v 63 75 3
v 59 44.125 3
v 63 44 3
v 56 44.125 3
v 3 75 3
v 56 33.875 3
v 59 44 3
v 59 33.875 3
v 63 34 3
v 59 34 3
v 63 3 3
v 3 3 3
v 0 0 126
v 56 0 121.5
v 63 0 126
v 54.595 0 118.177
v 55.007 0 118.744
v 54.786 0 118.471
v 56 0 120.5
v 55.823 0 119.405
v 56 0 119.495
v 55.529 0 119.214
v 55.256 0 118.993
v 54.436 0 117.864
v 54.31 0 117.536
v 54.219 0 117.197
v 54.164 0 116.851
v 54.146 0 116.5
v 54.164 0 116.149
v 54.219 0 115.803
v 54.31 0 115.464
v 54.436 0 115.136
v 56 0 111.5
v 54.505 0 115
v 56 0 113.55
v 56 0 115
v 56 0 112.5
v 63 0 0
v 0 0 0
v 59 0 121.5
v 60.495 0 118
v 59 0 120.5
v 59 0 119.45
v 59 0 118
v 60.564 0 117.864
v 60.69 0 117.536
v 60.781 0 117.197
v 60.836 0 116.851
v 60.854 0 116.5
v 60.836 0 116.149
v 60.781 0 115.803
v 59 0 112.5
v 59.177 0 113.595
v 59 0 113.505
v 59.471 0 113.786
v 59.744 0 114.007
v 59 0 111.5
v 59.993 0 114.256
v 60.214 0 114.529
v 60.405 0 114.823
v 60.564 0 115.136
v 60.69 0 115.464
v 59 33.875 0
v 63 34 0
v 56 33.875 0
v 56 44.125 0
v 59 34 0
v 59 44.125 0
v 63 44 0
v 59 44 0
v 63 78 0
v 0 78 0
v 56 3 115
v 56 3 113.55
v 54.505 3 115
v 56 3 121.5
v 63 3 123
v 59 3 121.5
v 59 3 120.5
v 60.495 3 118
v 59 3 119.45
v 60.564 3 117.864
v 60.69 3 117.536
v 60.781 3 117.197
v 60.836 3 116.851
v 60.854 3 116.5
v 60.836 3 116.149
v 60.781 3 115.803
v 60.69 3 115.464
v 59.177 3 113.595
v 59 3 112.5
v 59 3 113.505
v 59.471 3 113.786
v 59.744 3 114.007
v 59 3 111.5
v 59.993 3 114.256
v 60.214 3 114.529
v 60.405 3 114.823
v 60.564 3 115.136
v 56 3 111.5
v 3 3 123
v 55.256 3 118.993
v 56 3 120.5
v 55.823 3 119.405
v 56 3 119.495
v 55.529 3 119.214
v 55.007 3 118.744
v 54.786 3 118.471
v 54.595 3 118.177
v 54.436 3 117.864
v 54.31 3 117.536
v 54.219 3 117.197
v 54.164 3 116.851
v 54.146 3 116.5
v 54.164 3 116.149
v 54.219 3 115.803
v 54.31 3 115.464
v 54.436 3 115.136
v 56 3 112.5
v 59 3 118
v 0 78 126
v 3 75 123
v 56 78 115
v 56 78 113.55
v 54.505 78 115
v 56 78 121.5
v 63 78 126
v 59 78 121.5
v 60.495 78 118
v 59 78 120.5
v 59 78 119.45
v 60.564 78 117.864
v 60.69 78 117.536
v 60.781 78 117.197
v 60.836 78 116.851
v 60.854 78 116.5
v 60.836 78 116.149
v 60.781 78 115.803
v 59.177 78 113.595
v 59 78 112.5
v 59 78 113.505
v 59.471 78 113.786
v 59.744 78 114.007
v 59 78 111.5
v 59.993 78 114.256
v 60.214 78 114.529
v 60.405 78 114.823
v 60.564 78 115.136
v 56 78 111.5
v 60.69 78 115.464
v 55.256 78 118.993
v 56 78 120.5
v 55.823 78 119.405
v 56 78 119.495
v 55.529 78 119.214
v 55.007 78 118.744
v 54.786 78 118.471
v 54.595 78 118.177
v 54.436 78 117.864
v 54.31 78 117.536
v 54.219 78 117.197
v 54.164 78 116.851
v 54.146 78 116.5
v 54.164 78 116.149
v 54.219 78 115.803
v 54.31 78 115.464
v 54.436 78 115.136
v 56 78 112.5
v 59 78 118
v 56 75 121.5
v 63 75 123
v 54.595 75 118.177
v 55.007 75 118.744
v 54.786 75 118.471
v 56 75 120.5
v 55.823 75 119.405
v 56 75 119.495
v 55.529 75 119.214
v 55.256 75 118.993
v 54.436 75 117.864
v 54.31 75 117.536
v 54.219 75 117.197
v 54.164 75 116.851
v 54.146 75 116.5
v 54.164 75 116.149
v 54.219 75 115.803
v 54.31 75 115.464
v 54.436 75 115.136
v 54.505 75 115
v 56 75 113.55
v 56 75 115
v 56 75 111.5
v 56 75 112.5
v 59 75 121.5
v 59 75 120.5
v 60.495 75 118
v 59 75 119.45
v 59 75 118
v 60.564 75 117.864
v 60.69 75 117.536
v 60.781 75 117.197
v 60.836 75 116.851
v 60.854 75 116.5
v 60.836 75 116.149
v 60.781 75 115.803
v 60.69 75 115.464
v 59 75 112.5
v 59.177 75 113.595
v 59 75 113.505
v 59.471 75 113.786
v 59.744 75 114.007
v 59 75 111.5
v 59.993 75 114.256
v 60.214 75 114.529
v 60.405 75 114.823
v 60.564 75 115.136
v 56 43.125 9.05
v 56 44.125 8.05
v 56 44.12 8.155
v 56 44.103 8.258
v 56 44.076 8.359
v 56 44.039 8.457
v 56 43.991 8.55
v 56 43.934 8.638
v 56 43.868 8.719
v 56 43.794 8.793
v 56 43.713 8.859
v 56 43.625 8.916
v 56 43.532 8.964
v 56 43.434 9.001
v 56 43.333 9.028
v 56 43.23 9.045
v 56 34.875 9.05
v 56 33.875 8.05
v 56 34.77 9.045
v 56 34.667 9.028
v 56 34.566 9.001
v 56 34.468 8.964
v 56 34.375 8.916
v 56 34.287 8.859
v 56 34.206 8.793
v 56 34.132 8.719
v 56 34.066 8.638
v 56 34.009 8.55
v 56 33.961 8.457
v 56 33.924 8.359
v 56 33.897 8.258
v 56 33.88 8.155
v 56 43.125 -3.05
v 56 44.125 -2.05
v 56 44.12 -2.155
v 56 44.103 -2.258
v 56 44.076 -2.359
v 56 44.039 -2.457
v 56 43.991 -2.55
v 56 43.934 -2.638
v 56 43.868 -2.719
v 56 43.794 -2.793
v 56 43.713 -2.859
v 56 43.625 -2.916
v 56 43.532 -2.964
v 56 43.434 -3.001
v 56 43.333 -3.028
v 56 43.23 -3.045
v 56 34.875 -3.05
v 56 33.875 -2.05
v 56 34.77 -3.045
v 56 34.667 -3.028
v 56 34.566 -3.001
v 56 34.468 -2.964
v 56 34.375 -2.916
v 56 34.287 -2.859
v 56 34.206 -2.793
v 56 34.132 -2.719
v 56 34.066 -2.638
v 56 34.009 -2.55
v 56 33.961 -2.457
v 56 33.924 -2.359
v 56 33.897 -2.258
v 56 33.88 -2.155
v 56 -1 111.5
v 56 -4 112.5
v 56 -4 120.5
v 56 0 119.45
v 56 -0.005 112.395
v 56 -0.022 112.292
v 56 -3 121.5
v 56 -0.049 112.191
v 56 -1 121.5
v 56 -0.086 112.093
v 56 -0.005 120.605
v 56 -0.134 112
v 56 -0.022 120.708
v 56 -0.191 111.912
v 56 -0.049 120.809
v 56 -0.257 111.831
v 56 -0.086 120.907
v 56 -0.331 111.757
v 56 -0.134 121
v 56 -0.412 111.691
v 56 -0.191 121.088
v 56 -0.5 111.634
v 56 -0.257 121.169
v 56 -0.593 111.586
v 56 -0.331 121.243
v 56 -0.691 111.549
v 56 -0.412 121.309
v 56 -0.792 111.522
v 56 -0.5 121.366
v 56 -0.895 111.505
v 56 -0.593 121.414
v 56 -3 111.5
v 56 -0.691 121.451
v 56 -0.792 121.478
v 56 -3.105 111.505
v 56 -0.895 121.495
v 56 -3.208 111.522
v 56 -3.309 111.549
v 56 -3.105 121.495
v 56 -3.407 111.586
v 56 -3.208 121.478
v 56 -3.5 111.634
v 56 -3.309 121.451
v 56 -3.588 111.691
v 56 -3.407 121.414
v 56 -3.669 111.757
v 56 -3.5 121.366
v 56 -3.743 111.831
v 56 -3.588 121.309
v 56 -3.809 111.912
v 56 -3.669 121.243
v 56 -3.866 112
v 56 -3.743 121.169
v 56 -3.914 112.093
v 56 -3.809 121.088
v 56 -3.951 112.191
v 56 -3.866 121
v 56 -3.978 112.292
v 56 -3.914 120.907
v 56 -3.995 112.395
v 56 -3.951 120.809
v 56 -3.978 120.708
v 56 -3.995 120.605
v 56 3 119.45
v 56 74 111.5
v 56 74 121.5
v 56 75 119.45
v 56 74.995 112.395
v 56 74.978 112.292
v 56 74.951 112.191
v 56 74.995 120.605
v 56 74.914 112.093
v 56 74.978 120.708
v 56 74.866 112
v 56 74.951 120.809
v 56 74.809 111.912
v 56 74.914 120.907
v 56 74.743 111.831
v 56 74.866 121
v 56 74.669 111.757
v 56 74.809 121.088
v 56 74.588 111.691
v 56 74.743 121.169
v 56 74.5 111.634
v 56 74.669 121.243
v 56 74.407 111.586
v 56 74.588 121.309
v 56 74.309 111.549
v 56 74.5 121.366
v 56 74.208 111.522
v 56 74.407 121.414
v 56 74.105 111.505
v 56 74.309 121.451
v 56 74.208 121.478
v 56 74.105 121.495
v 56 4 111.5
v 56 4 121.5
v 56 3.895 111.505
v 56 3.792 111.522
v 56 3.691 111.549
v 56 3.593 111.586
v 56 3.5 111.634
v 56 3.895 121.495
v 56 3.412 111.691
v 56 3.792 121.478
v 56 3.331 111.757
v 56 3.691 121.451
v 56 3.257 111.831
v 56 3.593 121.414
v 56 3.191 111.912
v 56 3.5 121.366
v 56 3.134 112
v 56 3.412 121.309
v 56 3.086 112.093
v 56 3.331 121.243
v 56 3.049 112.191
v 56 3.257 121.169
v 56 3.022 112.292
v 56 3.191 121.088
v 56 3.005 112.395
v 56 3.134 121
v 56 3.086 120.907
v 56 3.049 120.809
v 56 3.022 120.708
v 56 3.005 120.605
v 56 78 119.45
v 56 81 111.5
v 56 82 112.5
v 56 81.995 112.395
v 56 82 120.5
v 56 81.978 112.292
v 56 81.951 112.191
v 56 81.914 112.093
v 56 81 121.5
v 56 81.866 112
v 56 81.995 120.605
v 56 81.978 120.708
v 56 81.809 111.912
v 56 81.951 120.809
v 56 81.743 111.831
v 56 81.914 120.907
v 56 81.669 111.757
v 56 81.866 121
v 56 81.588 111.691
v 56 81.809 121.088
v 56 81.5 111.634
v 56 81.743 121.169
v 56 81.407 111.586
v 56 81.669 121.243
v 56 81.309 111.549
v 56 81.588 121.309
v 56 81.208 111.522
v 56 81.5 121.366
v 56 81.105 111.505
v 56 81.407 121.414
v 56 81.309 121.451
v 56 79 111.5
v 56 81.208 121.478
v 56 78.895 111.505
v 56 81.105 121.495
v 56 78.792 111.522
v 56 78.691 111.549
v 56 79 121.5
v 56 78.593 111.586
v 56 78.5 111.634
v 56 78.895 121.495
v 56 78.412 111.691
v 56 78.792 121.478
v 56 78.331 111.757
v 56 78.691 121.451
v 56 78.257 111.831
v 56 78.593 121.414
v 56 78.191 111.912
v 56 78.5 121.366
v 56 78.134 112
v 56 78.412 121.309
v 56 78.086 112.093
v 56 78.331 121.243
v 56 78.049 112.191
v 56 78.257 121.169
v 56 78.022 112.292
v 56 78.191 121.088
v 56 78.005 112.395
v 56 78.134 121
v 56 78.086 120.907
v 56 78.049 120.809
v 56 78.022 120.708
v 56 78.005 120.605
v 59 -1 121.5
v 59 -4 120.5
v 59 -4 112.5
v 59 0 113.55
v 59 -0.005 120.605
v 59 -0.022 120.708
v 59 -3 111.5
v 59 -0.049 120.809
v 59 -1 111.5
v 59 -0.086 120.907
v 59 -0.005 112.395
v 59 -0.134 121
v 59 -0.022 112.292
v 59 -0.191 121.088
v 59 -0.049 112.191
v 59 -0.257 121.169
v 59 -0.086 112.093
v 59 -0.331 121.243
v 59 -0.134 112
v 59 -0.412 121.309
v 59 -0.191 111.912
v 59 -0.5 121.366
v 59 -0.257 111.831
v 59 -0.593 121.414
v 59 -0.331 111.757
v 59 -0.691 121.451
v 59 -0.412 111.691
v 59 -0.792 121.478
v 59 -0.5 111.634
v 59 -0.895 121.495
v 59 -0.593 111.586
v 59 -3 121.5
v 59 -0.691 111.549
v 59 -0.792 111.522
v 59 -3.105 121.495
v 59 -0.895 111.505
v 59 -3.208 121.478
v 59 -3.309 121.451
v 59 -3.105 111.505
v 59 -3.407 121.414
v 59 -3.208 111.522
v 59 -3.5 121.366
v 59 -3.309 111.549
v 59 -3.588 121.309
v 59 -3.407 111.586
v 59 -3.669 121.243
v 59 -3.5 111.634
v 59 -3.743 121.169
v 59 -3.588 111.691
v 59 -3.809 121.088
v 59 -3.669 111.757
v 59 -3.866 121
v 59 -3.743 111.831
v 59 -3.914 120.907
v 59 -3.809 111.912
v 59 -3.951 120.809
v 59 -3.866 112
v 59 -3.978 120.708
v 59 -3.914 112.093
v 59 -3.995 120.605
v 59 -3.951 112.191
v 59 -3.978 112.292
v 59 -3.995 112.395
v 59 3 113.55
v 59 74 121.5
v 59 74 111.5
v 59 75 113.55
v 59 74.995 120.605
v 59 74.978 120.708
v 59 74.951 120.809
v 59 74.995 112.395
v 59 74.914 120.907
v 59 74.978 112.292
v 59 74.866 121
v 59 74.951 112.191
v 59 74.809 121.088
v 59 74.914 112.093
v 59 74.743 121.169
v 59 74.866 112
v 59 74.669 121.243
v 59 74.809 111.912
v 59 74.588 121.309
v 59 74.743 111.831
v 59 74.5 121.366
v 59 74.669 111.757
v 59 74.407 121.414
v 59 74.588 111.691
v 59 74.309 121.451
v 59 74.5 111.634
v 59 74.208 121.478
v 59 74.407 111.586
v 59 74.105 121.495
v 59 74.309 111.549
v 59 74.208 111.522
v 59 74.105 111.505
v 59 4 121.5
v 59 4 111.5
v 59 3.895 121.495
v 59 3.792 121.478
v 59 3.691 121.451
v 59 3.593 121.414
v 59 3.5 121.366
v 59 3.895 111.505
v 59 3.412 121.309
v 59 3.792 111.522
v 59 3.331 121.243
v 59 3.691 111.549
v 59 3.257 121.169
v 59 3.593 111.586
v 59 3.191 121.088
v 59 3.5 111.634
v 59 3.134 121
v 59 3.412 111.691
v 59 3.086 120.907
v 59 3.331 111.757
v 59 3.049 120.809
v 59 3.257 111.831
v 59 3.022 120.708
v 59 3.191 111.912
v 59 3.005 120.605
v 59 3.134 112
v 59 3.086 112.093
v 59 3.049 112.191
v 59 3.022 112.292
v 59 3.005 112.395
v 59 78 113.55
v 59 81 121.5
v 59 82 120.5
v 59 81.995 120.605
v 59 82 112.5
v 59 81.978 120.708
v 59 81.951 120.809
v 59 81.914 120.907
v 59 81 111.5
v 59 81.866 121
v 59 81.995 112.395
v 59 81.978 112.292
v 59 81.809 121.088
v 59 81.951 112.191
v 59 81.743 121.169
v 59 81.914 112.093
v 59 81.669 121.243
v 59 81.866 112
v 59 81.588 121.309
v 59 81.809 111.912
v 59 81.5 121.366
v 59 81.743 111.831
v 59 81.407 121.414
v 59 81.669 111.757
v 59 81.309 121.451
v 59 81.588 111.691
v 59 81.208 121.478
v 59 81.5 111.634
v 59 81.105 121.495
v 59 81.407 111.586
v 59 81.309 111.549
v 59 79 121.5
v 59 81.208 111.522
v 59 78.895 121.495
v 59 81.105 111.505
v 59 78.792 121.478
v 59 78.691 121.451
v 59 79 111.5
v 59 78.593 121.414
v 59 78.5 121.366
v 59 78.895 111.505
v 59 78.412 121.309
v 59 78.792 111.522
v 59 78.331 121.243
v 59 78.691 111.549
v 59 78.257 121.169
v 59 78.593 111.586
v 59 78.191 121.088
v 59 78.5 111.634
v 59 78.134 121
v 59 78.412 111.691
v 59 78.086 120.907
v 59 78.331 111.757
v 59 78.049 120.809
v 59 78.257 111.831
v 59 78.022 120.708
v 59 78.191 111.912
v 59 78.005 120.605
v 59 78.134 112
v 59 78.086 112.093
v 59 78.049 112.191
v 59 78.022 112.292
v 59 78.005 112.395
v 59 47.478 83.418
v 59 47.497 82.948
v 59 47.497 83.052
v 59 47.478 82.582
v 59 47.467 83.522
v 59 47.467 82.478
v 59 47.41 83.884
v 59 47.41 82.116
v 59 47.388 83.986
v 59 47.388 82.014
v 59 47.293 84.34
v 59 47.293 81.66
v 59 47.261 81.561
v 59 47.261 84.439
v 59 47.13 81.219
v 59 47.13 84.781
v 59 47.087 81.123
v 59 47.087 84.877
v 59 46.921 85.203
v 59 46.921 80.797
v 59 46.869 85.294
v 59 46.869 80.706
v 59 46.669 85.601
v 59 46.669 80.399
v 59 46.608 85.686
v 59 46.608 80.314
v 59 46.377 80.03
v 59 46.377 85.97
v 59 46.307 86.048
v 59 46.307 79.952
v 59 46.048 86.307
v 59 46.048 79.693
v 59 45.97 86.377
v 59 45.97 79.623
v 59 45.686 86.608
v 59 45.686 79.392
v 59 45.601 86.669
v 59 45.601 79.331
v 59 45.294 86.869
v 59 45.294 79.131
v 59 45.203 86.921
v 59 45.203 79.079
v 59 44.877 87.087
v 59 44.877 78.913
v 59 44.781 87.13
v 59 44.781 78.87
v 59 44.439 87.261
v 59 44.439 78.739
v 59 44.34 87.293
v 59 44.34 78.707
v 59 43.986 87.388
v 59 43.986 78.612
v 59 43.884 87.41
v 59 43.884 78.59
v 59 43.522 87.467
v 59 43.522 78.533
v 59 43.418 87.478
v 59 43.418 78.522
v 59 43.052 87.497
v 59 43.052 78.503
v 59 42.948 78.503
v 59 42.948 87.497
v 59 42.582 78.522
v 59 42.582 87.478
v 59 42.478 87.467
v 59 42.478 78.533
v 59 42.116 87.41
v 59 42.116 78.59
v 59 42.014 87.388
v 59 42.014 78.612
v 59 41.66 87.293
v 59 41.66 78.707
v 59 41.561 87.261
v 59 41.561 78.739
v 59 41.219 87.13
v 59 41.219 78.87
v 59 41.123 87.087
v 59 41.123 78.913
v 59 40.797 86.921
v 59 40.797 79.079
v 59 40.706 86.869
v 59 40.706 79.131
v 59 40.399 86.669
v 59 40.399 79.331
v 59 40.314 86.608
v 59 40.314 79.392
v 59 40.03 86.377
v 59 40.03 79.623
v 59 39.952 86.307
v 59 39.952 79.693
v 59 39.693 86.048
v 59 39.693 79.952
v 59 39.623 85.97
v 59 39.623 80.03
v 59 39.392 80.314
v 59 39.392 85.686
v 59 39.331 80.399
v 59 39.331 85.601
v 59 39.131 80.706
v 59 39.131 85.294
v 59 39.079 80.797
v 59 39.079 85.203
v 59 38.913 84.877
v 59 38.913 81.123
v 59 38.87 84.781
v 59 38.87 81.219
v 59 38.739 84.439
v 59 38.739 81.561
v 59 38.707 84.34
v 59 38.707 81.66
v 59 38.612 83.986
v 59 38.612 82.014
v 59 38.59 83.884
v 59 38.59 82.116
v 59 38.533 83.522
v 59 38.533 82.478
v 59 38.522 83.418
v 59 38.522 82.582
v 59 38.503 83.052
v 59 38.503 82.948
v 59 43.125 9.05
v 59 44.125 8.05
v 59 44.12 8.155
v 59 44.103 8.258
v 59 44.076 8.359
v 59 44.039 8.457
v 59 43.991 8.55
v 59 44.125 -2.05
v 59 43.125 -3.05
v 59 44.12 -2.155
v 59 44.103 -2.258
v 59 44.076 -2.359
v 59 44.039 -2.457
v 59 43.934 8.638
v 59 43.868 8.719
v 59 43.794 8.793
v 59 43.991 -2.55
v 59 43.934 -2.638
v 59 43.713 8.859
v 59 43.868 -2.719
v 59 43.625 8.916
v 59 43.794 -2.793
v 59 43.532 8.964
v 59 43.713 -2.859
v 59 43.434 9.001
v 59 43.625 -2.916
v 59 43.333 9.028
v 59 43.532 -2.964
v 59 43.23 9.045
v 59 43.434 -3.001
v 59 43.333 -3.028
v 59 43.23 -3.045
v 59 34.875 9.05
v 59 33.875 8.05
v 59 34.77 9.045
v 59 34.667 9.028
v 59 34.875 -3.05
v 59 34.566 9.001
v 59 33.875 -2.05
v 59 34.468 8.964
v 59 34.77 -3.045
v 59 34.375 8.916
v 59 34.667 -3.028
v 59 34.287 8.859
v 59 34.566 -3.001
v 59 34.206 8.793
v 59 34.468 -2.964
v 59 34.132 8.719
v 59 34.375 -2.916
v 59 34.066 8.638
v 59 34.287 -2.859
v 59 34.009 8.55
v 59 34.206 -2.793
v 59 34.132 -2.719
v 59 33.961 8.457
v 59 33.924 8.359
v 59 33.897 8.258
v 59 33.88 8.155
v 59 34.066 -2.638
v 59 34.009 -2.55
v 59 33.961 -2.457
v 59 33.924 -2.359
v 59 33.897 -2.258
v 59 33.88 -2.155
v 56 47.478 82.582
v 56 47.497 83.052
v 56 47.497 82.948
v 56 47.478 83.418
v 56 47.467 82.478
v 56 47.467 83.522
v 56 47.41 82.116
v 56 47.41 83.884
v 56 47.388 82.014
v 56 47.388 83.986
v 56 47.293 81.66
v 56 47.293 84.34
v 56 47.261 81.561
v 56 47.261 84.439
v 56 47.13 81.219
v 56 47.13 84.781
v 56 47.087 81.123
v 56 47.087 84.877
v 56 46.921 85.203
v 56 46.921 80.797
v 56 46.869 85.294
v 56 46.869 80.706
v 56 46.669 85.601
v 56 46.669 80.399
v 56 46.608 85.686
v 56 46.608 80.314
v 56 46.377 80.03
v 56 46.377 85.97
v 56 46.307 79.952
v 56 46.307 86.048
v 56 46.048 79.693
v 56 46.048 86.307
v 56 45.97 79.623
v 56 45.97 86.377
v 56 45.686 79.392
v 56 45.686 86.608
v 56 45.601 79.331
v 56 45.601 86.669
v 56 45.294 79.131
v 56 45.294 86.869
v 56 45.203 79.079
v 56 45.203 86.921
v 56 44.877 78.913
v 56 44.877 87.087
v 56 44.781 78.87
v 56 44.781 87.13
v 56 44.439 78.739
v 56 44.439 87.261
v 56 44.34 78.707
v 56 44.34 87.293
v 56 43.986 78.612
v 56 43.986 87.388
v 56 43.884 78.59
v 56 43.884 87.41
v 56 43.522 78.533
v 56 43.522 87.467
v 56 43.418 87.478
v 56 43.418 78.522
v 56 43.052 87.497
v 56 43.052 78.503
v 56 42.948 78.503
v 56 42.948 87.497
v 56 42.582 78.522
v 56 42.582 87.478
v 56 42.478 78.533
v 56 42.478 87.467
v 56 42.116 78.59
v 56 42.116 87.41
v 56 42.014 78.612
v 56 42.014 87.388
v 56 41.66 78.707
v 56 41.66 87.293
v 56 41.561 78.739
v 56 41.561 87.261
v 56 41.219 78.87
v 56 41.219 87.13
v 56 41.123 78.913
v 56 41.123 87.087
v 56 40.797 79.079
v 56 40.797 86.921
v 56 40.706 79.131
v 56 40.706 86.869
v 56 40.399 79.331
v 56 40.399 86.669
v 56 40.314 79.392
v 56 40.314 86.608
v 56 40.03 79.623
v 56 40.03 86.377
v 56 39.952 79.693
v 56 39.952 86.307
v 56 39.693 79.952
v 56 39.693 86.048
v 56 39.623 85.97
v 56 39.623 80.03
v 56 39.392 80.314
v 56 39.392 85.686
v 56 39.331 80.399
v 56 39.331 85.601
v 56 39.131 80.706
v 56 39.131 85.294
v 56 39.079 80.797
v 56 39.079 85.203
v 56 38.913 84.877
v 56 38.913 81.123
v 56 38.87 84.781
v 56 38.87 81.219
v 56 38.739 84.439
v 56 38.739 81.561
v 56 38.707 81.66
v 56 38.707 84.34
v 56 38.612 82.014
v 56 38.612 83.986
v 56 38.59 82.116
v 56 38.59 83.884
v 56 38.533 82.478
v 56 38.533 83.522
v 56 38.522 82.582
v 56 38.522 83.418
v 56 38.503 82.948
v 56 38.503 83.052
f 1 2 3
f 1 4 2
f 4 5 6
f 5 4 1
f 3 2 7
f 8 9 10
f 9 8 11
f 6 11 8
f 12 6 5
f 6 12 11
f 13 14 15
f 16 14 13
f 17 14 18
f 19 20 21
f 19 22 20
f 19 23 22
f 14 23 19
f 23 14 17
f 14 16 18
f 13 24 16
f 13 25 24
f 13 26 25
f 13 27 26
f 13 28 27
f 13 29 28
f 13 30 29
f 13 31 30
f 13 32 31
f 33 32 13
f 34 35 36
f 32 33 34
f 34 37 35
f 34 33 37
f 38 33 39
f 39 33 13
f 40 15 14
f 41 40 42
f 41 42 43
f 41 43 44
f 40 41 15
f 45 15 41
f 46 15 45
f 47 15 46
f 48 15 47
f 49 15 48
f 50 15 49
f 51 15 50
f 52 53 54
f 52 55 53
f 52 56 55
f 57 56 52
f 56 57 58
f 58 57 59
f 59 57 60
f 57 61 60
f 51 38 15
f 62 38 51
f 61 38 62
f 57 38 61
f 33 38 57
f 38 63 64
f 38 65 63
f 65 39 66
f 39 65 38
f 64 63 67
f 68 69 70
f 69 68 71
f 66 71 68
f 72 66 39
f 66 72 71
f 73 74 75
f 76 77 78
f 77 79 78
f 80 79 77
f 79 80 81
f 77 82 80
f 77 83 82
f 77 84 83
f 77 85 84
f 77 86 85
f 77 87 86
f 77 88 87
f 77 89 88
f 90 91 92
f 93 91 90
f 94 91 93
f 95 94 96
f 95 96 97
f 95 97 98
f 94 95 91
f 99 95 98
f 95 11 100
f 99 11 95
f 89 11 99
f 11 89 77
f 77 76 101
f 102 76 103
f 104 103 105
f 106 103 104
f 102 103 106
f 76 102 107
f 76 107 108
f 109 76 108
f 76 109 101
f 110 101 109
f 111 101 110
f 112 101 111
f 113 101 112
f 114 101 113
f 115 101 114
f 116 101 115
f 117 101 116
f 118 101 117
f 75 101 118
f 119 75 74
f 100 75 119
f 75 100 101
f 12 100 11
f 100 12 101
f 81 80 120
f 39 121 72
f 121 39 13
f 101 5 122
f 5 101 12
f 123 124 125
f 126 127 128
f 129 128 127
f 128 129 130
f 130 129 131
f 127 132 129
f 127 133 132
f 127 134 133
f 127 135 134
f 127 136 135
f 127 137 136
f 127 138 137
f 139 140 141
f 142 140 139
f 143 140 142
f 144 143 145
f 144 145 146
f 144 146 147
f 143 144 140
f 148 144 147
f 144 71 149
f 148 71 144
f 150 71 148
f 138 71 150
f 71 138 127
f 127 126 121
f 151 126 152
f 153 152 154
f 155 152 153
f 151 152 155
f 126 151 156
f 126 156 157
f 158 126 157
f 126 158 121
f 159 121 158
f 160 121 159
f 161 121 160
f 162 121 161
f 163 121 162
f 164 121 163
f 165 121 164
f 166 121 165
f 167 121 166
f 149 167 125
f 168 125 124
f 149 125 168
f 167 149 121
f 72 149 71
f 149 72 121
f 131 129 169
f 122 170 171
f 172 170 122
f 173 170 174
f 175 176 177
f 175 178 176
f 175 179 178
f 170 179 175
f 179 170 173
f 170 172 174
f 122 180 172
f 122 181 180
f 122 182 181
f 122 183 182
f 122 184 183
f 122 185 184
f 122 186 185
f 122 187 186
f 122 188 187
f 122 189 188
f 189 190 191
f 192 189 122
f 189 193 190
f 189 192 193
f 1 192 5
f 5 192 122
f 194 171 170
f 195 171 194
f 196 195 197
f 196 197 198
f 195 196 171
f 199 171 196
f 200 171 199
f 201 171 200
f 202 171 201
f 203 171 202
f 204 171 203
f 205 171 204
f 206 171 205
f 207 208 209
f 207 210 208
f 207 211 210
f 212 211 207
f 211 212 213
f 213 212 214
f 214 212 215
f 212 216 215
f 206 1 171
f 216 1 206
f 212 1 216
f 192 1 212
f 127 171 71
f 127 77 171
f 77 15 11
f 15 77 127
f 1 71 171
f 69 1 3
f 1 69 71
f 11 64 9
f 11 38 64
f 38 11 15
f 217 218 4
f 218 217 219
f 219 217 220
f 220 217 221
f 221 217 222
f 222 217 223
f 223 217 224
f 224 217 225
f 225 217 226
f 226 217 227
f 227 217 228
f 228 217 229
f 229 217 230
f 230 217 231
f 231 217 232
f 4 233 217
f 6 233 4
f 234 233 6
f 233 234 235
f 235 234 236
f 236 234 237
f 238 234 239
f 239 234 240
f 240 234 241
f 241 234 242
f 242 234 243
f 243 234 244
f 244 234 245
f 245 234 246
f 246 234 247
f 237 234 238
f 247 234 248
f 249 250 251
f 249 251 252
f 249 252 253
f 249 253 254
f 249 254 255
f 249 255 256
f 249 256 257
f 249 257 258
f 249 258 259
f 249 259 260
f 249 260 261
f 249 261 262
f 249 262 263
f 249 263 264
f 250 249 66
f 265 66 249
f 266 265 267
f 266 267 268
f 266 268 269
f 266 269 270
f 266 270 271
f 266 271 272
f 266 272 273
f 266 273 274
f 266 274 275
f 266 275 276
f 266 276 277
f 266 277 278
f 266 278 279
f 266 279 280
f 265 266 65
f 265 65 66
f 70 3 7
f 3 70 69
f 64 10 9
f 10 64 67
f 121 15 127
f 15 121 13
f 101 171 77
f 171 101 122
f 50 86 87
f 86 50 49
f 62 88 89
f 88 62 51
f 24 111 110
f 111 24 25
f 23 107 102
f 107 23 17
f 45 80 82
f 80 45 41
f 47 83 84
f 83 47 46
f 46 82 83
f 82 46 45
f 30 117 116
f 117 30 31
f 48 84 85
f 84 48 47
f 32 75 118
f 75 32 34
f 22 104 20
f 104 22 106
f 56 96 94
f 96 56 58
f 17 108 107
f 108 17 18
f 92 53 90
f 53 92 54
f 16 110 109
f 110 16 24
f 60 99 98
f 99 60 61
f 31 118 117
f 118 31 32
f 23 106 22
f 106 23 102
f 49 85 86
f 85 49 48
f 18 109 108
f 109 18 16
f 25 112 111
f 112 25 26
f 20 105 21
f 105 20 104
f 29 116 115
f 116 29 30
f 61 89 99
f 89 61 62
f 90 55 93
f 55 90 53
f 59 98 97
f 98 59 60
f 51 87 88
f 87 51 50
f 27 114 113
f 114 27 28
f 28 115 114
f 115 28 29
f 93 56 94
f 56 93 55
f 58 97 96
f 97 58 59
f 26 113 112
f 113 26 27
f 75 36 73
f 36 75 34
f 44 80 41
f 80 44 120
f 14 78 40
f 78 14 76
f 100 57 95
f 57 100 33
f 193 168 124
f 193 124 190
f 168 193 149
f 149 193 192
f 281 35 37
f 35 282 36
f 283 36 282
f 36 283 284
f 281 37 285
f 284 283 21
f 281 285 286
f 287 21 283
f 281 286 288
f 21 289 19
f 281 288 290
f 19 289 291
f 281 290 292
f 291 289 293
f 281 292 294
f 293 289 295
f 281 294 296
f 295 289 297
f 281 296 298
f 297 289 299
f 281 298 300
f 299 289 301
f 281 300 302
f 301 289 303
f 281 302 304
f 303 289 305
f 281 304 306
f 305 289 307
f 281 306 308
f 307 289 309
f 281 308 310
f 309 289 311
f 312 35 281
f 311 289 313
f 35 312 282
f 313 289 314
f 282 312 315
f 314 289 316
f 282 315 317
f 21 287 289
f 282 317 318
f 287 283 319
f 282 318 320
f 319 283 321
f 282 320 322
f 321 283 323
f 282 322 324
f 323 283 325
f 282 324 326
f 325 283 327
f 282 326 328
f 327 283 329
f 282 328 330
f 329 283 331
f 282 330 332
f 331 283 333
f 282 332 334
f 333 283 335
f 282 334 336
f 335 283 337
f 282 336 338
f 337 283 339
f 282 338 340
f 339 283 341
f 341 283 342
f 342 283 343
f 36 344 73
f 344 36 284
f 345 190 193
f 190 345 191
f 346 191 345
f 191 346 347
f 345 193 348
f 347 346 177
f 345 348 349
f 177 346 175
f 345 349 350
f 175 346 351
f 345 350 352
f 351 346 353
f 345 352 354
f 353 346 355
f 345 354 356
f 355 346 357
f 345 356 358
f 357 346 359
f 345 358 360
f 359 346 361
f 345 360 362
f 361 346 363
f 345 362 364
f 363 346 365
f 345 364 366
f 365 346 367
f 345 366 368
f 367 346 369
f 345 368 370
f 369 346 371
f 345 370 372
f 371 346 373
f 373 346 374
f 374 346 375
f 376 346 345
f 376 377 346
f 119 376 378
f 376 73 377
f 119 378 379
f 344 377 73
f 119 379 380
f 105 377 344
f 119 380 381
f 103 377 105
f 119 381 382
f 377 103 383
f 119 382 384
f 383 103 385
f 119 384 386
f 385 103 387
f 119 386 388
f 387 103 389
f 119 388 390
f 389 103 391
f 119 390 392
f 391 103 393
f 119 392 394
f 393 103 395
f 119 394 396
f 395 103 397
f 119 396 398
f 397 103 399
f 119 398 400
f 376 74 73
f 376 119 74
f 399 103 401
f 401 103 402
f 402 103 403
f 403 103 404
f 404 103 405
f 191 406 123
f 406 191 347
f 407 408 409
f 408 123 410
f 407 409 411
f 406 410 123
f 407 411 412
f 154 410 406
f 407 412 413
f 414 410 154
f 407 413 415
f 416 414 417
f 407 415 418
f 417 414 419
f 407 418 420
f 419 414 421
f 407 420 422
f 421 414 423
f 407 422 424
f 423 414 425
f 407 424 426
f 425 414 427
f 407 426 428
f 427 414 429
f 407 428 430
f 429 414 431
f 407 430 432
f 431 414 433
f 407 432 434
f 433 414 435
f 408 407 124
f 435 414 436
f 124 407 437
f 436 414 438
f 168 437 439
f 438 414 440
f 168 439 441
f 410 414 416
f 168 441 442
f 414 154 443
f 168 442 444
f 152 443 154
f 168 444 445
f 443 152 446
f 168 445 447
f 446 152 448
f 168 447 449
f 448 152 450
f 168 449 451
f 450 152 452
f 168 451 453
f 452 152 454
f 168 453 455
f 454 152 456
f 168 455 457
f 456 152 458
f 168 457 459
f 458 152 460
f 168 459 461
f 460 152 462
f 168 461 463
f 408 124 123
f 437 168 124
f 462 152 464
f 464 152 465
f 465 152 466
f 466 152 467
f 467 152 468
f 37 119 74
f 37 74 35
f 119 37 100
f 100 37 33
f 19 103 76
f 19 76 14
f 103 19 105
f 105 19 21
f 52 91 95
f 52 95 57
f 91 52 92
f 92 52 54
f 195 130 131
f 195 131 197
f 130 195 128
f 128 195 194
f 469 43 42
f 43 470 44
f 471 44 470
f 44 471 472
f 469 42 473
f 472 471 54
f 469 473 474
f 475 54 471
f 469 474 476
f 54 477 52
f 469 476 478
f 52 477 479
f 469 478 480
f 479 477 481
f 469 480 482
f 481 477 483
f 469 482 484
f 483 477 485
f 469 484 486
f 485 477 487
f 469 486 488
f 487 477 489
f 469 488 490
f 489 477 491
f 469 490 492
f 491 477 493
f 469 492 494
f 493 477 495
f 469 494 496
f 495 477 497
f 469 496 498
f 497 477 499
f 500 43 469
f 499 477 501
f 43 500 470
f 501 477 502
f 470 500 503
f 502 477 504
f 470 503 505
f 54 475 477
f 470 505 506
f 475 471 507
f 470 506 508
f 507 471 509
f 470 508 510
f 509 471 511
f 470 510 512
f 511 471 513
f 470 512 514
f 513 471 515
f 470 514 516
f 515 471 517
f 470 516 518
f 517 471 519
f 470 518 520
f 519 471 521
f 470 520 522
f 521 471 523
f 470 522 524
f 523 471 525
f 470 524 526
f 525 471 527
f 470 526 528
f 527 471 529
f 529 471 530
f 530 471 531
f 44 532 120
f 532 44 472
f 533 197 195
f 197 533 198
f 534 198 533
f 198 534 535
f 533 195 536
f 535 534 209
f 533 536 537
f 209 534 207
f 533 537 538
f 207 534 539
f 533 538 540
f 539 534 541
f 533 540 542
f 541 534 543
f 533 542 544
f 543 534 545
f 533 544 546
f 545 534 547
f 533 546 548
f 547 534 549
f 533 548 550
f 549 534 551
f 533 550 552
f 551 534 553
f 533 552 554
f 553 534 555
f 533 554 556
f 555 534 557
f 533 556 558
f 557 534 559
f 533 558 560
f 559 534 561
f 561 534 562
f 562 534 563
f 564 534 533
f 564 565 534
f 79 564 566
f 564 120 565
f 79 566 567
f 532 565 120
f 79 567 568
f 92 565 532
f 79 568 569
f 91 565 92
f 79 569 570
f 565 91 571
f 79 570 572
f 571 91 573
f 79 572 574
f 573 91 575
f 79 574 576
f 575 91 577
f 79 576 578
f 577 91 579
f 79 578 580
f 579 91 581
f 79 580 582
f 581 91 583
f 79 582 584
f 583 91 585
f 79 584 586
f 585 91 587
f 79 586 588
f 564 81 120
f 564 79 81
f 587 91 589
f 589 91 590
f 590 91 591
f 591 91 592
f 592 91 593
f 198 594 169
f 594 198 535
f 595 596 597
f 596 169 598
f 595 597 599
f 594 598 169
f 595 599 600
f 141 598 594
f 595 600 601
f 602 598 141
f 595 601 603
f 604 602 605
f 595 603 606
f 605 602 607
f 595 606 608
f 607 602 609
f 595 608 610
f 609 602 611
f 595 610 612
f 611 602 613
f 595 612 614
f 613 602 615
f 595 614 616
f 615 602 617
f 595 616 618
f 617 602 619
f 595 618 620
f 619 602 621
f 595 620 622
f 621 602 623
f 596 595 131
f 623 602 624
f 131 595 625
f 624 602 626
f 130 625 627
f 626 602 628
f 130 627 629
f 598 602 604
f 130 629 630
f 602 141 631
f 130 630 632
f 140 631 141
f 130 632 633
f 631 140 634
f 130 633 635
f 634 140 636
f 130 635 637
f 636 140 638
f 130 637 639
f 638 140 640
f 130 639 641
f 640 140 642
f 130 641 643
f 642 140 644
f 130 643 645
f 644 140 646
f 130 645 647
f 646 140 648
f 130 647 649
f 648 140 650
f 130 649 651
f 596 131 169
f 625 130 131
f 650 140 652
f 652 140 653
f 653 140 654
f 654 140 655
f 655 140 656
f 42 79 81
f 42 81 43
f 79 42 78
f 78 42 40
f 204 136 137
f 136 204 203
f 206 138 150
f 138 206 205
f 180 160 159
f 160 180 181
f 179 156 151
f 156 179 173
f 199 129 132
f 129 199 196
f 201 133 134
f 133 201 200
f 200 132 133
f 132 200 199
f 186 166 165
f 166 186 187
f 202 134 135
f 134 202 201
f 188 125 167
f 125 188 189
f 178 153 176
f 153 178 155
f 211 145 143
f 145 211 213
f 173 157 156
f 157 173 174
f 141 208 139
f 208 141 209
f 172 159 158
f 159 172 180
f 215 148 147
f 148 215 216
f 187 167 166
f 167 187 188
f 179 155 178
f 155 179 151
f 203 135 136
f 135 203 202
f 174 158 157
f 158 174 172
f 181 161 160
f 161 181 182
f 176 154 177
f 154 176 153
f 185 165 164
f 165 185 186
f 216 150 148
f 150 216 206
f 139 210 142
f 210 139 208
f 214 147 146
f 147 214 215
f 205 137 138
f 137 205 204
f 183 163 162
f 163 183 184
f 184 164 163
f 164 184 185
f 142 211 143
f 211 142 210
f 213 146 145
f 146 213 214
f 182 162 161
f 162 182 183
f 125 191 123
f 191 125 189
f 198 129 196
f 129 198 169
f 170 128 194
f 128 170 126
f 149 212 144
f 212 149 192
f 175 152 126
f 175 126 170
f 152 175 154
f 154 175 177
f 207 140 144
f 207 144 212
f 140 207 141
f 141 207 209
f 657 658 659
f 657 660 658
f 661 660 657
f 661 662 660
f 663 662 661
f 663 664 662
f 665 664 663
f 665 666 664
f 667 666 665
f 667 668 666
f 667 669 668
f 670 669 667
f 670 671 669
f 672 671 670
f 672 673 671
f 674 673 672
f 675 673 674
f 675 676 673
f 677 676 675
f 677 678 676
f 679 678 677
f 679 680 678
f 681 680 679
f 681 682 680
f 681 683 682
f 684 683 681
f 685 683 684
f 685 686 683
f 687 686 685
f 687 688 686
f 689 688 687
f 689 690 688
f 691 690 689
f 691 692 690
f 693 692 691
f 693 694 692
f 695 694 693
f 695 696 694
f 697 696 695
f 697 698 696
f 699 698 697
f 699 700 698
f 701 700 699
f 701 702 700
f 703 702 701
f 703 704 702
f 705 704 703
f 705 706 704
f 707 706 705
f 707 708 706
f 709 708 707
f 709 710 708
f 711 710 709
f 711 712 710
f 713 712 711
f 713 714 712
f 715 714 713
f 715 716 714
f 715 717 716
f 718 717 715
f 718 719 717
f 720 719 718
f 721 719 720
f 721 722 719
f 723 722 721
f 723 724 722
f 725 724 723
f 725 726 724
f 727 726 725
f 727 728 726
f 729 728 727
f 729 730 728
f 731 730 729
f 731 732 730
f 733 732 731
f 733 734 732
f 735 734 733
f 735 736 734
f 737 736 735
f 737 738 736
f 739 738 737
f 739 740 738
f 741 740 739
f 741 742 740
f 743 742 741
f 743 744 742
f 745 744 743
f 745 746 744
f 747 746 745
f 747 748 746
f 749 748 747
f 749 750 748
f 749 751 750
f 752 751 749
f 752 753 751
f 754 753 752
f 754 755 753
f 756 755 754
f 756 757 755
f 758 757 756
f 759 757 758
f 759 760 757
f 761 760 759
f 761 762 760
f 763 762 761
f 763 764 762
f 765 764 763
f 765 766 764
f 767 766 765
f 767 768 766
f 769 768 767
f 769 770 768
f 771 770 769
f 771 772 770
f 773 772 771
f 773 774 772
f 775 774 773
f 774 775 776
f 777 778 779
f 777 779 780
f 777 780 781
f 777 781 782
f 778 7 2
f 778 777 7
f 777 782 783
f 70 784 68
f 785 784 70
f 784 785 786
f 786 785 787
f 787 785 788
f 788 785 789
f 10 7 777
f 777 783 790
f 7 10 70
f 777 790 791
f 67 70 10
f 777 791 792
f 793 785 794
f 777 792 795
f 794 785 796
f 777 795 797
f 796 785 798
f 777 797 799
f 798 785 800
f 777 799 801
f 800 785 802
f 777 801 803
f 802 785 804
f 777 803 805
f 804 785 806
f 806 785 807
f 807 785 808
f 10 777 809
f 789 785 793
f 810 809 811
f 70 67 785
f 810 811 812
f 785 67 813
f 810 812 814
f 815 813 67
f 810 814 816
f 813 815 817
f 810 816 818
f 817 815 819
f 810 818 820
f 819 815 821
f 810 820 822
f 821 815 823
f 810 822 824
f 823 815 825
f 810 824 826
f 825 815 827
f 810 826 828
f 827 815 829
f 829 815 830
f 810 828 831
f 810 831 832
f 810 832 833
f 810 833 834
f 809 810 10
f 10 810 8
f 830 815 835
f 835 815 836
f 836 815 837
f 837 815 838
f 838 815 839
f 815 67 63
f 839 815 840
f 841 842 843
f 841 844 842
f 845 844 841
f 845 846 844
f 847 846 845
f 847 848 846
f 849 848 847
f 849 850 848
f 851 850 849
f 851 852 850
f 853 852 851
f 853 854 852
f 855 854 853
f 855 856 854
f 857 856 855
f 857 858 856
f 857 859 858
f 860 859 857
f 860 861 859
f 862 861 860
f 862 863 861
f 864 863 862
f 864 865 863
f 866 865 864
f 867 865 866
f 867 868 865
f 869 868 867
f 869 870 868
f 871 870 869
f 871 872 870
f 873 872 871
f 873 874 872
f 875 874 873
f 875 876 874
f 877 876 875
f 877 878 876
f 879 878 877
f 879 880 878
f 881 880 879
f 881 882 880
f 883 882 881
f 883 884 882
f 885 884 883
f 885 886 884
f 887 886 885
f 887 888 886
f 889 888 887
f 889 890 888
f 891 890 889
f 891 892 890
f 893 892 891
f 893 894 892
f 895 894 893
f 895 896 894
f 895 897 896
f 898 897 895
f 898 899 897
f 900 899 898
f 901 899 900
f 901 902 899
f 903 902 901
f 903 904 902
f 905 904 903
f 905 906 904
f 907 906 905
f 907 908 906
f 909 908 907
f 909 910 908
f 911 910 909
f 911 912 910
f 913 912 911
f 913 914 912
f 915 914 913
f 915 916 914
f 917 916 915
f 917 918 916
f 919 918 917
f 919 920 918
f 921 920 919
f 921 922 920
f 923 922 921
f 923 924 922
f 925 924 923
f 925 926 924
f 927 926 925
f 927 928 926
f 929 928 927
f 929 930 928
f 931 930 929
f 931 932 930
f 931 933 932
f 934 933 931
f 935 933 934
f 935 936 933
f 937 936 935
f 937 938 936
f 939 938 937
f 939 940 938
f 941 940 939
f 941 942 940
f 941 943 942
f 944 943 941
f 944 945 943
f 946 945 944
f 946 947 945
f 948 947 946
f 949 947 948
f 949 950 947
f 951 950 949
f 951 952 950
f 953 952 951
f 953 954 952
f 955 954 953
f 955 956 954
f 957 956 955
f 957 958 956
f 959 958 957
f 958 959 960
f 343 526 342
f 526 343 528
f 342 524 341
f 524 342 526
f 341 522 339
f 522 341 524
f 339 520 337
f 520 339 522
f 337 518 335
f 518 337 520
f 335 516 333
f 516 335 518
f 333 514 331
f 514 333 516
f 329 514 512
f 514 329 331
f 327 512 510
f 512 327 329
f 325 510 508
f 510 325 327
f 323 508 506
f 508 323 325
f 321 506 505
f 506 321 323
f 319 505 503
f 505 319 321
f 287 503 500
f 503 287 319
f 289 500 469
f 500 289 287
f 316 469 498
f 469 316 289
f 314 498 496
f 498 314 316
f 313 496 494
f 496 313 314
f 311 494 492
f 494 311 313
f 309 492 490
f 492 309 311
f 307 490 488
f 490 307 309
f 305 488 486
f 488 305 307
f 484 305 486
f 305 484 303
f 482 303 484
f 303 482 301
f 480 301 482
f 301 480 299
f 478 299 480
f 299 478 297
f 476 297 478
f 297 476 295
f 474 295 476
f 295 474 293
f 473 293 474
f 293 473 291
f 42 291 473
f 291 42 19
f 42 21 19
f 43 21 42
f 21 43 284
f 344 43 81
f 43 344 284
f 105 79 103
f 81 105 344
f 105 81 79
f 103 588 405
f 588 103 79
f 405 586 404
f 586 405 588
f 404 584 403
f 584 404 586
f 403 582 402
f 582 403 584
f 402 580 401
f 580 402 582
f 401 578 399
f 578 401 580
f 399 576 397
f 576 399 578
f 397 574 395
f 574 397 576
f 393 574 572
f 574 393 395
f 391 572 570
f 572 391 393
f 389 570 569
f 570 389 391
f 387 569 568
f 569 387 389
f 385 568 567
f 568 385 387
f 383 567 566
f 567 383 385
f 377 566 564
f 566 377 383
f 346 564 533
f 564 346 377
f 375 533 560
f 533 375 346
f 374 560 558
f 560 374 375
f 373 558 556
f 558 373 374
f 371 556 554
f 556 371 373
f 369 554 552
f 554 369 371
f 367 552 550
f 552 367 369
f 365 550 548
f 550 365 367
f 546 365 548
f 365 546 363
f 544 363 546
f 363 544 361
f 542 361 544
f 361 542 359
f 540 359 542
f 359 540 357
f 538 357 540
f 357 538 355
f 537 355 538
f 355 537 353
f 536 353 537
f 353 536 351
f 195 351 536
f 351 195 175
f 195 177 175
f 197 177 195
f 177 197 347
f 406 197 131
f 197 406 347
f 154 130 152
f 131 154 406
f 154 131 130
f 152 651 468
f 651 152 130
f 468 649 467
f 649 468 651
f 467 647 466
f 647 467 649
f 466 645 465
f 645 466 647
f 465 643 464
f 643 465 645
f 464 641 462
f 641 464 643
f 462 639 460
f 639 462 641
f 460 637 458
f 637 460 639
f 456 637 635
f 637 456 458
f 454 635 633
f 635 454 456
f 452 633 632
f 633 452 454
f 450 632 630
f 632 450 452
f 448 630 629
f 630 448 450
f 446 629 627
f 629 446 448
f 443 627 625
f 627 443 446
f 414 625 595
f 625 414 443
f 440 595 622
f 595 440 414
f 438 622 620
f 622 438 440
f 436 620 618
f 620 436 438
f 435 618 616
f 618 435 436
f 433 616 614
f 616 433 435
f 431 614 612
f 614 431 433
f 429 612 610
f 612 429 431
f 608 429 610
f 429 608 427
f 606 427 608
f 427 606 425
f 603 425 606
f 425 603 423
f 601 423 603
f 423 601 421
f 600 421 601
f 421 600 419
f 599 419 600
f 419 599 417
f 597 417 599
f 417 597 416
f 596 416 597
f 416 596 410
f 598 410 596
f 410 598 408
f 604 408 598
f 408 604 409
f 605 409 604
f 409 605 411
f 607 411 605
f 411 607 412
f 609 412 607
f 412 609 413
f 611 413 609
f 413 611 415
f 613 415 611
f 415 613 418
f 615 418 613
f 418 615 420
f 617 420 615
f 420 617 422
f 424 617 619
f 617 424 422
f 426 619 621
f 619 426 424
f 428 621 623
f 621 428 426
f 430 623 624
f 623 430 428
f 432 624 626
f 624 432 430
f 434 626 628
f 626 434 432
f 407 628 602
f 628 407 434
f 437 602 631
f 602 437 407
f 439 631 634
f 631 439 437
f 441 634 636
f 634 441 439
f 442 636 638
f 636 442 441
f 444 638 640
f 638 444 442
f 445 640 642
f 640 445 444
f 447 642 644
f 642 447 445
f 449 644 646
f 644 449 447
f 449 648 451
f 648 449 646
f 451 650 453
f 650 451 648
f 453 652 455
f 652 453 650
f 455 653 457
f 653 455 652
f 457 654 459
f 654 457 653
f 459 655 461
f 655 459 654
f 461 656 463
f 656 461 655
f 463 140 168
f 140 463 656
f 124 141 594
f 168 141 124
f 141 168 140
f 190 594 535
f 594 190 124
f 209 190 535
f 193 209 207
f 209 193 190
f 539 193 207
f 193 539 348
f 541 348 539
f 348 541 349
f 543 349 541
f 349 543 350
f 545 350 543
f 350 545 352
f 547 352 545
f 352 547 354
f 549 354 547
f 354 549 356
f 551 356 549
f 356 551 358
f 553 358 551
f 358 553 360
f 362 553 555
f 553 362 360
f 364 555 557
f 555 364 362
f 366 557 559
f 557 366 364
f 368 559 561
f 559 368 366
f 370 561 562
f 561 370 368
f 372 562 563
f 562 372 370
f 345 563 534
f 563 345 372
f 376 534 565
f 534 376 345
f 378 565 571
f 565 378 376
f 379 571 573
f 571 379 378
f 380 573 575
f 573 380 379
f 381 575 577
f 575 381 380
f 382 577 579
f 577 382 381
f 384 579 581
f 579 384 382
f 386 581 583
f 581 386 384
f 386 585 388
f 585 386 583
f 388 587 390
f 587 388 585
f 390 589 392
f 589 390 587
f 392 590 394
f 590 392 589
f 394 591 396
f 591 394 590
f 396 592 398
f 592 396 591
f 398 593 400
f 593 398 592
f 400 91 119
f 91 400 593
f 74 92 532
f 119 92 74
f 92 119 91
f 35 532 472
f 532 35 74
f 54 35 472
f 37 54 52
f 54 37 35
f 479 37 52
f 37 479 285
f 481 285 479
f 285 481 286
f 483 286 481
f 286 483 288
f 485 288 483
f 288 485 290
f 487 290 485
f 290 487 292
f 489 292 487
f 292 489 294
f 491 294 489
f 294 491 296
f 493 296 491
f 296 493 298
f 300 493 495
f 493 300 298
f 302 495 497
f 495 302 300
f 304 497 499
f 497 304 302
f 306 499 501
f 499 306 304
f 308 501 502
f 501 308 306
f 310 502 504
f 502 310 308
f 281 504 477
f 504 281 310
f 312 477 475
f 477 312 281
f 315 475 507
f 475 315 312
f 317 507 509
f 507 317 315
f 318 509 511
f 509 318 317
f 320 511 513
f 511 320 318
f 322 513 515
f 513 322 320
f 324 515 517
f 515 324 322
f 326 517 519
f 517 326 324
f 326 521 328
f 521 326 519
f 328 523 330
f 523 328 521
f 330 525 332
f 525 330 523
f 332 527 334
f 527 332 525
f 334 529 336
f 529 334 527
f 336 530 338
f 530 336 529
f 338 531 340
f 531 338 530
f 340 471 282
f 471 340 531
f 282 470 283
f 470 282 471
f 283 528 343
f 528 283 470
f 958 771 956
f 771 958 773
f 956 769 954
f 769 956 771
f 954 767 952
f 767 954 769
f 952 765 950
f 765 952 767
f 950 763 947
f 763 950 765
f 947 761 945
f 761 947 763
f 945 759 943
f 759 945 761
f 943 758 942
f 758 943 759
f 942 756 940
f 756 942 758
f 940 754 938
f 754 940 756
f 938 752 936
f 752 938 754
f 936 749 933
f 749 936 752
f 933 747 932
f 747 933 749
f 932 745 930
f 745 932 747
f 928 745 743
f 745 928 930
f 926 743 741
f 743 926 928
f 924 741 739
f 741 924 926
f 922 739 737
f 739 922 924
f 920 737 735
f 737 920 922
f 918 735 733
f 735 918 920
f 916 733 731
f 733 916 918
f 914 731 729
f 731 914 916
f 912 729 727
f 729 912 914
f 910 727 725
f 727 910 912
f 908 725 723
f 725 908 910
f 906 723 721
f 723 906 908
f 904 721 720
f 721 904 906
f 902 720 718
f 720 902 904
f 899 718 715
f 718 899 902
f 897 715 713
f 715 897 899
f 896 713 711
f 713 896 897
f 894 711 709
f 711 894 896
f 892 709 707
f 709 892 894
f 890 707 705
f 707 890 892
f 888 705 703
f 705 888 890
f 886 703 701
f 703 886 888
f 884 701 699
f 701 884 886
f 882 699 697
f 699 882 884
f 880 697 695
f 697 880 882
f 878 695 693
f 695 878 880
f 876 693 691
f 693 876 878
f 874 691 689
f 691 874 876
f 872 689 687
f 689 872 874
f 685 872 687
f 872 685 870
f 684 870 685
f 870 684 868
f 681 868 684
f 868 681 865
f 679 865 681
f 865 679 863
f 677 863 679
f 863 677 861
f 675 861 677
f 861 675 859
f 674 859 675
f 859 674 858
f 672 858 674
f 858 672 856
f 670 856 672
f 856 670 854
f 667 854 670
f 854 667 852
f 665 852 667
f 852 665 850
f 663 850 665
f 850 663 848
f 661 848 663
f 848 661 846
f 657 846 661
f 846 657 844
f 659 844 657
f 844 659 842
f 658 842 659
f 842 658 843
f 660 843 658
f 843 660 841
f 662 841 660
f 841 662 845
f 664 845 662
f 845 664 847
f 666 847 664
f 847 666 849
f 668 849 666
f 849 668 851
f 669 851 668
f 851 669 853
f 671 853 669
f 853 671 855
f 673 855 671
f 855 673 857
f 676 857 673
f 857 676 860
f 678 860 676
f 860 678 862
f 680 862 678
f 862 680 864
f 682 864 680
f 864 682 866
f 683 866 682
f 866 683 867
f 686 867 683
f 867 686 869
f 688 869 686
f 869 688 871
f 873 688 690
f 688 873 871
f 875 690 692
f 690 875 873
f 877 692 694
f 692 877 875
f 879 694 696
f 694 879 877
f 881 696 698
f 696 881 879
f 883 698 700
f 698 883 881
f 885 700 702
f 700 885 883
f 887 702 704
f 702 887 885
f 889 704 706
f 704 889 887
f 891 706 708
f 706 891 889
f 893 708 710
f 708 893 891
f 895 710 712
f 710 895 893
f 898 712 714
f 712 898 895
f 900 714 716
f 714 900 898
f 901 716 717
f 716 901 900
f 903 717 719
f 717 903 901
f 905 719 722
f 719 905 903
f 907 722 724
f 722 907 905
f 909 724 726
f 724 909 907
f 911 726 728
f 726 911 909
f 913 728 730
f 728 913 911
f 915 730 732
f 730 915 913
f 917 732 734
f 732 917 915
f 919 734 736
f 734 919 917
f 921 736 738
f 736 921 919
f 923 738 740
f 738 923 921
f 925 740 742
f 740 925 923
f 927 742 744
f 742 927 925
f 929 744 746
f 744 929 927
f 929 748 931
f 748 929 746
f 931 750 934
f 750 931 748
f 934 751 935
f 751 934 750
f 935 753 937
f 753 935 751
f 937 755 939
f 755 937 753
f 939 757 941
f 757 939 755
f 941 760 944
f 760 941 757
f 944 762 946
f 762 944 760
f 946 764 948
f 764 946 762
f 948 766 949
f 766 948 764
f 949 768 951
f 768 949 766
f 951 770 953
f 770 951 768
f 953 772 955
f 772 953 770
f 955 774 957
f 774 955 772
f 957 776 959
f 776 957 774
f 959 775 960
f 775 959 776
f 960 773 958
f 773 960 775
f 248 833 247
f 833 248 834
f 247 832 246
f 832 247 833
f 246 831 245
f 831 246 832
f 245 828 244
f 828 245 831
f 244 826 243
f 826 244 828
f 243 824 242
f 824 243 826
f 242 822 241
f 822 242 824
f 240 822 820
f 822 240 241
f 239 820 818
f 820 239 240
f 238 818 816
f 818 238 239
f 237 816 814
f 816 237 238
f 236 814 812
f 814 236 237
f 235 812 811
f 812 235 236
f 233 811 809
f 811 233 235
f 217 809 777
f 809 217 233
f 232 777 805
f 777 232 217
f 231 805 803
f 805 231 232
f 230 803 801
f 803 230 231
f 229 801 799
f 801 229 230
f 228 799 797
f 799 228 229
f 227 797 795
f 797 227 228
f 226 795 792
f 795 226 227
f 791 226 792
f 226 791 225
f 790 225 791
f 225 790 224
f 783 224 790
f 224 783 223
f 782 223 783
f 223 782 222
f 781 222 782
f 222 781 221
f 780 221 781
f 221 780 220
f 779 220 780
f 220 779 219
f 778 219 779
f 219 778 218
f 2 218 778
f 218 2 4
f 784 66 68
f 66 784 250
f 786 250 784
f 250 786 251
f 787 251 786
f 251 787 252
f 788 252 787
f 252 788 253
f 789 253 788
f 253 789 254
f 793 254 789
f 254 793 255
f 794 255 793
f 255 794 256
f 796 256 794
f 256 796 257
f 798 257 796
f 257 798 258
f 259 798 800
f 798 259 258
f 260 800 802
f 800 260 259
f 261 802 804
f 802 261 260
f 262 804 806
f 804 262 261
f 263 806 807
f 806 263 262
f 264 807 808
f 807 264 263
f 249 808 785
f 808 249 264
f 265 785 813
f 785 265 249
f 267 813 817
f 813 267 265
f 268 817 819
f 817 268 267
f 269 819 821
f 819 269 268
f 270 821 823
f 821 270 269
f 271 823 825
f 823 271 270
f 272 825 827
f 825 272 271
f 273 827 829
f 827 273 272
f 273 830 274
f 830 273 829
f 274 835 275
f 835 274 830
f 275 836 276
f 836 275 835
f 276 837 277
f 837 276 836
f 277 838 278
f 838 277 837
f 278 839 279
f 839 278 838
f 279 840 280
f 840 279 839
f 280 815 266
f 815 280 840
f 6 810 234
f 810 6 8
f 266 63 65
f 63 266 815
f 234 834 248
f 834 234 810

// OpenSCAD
include <lasercut.scad>; 

$fn = 60;

thickness = 3;
x_gps_space = 0;
x0 = 50 + 2 * thickness + x_gps_space;
x_pad = 7;
x = x0 + x_pad;
y = 72 + 2 * thickness;
z = 120 + 2 * thickness;
x_twist_ledge = 4;

holder_width = 10;

x_twist_extra_space = 0.5 * thickness;
x_twist = 10;

x_twist_pos = z - x_twist / 2 - 2 * thickness - x_twist_extra_space;

twist_array = [[DOWN, x0 - thickness / 2, x_twist_pos, x_twist, 2 * thickness]];


manifoldCorrection = 0.1;


module box() {
    lasercutoutBox(thickness = thickness, x=x, y=y, z=z,
        sides=5, num_fingers=2,
        twist_holes_a=[[], [],
            twist_array,
            twist_array,
        ],
        cutouts_a = [
            [[x0 - thickness, y/2-holder_width/2 - thickness, x_pad + manifoldCorrection, holder_width]]
        ]
    );
}


module fillet(smooth) {
   offset(r = smooth) {
     offset(delta = -smooth) {
       children();
     }
   }
}


module panelSquare() {
    translate([thickness, thickness])
    difference() {
        %square([z - 2 * thickness - 1.0, y - 2 * thickness], center=false);
        
        //translate([30, 40])
        //square([28, 28]);
        
        translate([z - 46, 40])
        circle(d=9);
    }
    holder_ledge = thickness + 3;
    translate([holder_ledge / 2, y / 2])
    square([2 * holder_ledge + manifoldCorrection, holder_width + 0.25], center=true);
}


module panel2d() {
    fillet(1)
    union() {
        panelSquare();

        translate([x_twist_pos - x_twist / 2 + thickness, -x_twist_ledge])
        projection()
        lasercutoutSquare(thickness=thickness, x=x_twist, y=y + 2 * x_twist_ledge,
            twist_connect=[
                [RIGHT,0,x_twist_ledge,2*thickness - manifoldCorrection],
                [RIGHT,0,y - thickness + x_twist_ledge,2*thickness - manifoldCorrection],
            ]
        );
    }
}



module panel3d() {
    translate([x0 + thickness, 0, 0])
    rotate([0, -90, 0])
    linear_extrude(height=thickness)
    panel2d();
}


box();
panel3d();
//panel2d();
